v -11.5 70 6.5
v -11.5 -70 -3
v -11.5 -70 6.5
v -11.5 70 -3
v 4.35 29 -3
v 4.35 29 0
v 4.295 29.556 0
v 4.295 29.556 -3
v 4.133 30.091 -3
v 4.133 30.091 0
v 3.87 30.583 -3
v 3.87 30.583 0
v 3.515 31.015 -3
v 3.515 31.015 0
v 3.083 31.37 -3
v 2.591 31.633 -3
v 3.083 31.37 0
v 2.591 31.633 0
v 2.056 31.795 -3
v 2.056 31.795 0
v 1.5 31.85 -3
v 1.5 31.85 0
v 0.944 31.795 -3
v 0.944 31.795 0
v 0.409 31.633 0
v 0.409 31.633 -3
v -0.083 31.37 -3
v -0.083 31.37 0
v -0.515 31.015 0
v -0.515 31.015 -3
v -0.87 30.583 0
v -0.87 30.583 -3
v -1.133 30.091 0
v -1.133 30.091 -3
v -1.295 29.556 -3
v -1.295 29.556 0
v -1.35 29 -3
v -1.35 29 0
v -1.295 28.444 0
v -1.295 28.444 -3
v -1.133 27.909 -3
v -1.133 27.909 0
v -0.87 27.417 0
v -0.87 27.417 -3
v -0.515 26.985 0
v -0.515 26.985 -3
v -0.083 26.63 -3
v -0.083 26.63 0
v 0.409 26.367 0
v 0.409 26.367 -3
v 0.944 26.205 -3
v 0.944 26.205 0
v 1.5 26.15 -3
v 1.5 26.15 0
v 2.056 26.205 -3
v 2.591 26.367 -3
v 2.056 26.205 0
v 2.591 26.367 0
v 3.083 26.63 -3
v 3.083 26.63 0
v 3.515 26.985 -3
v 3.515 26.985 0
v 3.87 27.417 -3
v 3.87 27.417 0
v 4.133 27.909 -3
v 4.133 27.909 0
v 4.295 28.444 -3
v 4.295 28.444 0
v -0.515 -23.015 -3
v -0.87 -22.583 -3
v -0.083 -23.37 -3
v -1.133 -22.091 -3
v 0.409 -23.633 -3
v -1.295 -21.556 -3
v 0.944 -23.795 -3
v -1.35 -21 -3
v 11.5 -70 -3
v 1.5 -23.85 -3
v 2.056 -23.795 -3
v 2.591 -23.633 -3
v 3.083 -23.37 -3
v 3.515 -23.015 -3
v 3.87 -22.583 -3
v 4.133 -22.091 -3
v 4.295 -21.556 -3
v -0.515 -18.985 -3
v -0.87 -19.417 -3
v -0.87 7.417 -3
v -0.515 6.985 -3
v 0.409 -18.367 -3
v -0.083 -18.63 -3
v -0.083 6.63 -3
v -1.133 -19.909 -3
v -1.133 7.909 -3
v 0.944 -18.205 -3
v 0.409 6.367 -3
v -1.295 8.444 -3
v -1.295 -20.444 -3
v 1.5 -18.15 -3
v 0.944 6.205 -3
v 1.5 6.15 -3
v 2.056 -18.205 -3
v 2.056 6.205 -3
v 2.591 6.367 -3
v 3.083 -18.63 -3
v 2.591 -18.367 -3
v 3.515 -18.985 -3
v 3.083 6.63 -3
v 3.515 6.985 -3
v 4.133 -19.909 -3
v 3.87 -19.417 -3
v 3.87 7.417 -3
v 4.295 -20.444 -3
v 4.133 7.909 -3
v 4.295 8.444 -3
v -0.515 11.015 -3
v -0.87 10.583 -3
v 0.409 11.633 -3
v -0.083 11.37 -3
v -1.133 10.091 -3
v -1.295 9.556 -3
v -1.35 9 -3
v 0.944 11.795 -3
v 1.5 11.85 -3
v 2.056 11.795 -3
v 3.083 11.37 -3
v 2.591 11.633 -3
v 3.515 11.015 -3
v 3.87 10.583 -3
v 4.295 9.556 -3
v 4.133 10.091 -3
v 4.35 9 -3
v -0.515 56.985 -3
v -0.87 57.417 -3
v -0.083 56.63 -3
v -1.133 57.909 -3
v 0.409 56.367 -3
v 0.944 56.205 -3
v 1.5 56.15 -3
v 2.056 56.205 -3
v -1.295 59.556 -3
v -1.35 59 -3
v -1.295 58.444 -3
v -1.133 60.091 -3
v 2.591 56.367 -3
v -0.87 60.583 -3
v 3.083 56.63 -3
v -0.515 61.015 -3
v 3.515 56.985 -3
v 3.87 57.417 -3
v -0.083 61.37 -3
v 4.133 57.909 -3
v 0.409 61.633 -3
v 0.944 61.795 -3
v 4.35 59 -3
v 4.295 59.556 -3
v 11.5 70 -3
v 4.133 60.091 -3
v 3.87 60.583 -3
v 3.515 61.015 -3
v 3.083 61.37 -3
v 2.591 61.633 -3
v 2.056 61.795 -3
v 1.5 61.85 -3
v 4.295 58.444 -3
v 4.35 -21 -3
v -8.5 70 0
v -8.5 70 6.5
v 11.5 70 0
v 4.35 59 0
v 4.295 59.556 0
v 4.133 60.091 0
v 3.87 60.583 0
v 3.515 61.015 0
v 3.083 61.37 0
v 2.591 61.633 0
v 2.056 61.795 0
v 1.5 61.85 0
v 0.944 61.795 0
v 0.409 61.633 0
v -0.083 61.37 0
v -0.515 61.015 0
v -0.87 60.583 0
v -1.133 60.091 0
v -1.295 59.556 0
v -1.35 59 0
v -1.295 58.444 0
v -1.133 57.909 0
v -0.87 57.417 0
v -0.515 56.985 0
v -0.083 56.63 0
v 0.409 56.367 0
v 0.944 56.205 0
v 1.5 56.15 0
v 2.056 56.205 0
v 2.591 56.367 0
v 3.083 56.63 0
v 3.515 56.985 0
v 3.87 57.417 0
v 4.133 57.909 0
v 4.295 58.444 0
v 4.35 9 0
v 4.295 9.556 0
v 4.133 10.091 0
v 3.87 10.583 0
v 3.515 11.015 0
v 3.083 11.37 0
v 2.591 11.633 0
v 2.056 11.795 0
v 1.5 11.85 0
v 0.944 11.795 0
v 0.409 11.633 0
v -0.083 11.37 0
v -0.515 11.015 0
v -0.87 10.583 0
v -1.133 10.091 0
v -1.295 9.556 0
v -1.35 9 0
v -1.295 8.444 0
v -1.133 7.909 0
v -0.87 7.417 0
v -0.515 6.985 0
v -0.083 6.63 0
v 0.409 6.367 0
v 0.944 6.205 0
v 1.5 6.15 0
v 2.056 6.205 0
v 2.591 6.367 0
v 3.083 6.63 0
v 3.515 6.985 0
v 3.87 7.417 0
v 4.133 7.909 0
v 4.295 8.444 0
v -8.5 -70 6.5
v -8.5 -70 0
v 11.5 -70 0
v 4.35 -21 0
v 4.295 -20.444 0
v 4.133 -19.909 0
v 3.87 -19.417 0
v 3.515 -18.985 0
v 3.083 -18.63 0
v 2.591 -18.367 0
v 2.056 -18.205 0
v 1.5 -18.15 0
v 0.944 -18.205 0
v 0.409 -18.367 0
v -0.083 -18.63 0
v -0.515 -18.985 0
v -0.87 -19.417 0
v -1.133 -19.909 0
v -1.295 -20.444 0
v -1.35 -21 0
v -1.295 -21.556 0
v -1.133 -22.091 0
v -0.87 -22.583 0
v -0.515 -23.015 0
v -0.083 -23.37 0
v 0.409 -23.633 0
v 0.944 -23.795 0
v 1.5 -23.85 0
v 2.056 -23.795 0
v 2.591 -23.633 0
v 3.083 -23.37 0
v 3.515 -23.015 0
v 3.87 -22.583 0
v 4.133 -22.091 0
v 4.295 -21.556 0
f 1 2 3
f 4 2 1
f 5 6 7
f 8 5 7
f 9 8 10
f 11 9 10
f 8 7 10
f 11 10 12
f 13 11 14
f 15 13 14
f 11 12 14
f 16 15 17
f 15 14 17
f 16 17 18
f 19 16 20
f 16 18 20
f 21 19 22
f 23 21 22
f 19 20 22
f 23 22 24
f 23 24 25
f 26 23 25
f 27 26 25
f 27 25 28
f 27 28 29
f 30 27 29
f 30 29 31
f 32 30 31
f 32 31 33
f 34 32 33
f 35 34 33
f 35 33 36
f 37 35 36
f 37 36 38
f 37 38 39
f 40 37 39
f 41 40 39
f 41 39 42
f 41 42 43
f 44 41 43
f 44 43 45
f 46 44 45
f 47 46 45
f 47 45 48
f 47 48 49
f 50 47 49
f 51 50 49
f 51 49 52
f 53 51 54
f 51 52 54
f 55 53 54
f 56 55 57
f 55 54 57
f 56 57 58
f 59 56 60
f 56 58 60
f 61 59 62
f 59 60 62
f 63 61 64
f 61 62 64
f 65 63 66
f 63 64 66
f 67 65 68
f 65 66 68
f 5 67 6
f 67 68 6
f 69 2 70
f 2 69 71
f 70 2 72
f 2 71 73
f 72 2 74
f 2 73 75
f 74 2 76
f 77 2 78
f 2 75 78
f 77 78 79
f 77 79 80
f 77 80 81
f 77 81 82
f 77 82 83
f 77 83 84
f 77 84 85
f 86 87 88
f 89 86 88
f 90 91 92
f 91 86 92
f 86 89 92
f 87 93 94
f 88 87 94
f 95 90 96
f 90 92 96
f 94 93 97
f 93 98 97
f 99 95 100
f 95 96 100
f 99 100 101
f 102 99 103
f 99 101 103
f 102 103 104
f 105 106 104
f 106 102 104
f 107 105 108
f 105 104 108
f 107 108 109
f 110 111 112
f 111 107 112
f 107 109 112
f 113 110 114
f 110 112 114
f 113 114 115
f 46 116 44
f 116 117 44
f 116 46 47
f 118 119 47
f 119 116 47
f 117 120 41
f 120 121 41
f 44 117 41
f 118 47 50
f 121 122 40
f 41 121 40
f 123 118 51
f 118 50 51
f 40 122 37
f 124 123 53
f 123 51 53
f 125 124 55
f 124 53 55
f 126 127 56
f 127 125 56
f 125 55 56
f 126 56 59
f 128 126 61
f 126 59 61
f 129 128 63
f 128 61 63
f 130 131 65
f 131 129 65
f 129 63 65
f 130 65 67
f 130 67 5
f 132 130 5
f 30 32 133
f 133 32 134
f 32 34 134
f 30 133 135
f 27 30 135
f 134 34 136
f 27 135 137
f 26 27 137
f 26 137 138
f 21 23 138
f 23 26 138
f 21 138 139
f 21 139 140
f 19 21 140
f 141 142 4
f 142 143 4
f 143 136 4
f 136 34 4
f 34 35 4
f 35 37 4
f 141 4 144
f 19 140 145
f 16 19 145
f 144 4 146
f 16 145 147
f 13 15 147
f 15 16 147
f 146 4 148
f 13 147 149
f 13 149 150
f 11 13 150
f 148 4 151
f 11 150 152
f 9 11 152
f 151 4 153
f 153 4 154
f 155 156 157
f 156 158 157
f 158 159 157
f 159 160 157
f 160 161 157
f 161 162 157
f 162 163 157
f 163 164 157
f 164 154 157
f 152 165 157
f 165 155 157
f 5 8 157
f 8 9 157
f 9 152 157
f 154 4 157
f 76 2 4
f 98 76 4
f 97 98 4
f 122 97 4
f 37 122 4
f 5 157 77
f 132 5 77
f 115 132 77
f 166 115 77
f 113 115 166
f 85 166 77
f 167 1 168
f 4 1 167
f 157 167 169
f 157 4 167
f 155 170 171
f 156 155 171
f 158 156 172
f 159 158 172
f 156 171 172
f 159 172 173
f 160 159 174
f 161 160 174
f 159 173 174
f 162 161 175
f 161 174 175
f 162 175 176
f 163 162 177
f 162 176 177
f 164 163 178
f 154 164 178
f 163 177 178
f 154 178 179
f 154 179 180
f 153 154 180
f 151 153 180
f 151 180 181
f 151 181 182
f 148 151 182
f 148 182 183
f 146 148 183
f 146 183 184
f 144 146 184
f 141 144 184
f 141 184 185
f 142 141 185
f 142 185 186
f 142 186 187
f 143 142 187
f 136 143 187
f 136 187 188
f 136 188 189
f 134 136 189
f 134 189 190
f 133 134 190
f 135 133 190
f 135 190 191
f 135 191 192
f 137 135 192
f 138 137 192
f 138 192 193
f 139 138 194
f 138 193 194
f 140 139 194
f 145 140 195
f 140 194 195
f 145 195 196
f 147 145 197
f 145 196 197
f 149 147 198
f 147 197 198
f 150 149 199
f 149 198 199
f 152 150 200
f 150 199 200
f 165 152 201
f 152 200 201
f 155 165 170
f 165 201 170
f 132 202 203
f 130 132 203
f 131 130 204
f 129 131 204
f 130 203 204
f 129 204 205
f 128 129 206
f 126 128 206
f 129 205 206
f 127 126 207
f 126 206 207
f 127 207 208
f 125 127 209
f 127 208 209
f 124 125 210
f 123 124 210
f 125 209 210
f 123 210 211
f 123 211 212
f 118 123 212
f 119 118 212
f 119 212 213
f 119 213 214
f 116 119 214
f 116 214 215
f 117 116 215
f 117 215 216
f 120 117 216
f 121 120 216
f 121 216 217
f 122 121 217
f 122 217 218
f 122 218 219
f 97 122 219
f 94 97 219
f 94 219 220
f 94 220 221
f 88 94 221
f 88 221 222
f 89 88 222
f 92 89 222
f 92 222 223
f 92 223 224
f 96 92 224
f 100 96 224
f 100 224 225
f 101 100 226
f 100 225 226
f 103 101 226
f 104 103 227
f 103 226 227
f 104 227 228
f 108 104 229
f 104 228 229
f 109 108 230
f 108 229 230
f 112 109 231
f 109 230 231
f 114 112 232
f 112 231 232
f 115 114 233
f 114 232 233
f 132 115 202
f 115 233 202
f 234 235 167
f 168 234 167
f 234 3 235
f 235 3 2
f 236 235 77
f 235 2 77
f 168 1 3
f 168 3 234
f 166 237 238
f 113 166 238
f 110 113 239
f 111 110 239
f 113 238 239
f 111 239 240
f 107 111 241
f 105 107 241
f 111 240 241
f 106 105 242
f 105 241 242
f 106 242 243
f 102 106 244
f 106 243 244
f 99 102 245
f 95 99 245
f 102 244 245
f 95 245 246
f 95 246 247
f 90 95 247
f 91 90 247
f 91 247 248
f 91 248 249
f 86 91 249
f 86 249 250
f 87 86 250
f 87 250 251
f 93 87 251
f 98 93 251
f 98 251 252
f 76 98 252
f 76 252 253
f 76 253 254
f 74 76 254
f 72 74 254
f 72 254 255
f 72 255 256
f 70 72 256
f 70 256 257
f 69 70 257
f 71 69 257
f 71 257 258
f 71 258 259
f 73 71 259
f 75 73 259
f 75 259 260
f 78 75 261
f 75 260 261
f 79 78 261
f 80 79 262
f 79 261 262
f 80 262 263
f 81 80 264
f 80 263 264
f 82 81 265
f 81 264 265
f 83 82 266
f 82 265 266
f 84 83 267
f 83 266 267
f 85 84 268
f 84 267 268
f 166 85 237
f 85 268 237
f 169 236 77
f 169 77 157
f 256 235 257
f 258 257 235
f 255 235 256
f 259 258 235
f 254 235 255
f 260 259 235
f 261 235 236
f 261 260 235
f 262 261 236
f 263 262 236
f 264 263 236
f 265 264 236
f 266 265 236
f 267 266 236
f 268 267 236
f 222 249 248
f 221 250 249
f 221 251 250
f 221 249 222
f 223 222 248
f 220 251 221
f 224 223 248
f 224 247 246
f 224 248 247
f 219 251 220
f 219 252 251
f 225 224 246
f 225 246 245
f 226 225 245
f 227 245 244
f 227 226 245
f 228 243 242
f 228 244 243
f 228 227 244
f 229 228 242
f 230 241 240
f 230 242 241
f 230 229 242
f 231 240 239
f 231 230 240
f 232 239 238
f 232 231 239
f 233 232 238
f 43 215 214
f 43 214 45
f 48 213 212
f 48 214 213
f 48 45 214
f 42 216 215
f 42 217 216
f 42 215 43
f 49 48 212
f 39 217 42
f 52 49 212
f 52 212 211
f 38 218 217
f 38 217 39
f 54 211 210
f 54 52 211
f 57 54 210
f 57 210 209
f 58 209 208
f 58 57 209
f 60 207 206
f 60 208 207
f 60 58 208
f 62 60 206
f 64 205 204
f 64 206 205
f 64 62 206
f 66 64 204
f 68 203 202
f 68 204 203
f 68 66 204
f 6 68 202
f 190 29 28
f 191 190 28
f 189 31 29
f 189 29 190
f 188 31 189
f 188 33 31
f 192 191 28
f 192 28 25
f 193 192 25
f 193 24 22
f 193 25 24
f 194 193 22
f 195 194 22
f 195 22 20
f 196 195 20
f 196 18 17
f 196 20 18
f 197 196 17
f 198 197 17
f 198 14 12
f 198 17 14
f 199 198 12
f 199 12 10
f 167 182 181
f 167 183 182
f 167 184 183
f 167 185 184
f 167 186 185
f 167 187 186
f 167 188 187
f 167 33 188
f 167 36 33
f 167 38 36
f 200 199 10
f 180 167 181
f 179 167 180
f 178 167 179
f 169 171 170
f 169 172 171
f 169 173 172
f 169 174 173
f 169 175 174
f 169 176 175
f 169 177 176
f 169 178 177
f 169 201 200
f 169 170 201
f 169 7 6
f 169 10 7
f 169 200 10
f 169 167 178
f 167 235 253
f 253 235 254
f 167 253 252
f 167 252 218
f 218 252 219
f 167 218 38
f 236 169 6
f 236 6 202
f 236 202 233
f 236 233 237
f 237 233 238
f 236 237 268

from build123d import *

# Parameters (mm, degrees)
SKETCH1_W           = 23
SKETCH1_H           = 140
BOSS_EXTRUDE1_DEPTH = 3
SKETCH4_W           = 3
SKETCH4_H           = 140
BOSS_EXTRUDE3_DEPTH = 6.5
SKETCH3_R           = 2.85
CUT_EXTRUDE5_DEPTH  = 8.5


with BuildPart() as part:
    # Sketch1 → Boss-Extrude1 (new body)
    with BuildSketch(Plane.XY):
        Rectangle(SKETCH1_W, SKETCH1_H)
    extrude(amount=-BOSS_EXTRUDE1_DEPTH)

    # Sketch4 → Boss-Extrude3 (add)
    with BuildSketch(Plane.XY):
        with Locations((-10, 0)):
            Rectangle(SKETCH4_W, SKETCH4_H)
    extrude(amount=BOSS_EXTRUDE3_DEPTH)

    # Sketch3 → Cut-Extrude5 (cut)
    with BuildSketch(Plane.XY):
        with Locations((1.5, 59)):
            Circle(SKETCH3_R)
        with Locations((1.5, 29)):
            Circle(SKETCH3_R)
        with Locations((1.5, 9)):
            Circle(SKETCH3_R)
        with Locations((1.5, -21)):
            Circle(SKETCH3_R)
    extrude(amount=-CUT_EXTRUDE5_DEPTH, mode=Mode.SUBTRACT)


solid = part.part
